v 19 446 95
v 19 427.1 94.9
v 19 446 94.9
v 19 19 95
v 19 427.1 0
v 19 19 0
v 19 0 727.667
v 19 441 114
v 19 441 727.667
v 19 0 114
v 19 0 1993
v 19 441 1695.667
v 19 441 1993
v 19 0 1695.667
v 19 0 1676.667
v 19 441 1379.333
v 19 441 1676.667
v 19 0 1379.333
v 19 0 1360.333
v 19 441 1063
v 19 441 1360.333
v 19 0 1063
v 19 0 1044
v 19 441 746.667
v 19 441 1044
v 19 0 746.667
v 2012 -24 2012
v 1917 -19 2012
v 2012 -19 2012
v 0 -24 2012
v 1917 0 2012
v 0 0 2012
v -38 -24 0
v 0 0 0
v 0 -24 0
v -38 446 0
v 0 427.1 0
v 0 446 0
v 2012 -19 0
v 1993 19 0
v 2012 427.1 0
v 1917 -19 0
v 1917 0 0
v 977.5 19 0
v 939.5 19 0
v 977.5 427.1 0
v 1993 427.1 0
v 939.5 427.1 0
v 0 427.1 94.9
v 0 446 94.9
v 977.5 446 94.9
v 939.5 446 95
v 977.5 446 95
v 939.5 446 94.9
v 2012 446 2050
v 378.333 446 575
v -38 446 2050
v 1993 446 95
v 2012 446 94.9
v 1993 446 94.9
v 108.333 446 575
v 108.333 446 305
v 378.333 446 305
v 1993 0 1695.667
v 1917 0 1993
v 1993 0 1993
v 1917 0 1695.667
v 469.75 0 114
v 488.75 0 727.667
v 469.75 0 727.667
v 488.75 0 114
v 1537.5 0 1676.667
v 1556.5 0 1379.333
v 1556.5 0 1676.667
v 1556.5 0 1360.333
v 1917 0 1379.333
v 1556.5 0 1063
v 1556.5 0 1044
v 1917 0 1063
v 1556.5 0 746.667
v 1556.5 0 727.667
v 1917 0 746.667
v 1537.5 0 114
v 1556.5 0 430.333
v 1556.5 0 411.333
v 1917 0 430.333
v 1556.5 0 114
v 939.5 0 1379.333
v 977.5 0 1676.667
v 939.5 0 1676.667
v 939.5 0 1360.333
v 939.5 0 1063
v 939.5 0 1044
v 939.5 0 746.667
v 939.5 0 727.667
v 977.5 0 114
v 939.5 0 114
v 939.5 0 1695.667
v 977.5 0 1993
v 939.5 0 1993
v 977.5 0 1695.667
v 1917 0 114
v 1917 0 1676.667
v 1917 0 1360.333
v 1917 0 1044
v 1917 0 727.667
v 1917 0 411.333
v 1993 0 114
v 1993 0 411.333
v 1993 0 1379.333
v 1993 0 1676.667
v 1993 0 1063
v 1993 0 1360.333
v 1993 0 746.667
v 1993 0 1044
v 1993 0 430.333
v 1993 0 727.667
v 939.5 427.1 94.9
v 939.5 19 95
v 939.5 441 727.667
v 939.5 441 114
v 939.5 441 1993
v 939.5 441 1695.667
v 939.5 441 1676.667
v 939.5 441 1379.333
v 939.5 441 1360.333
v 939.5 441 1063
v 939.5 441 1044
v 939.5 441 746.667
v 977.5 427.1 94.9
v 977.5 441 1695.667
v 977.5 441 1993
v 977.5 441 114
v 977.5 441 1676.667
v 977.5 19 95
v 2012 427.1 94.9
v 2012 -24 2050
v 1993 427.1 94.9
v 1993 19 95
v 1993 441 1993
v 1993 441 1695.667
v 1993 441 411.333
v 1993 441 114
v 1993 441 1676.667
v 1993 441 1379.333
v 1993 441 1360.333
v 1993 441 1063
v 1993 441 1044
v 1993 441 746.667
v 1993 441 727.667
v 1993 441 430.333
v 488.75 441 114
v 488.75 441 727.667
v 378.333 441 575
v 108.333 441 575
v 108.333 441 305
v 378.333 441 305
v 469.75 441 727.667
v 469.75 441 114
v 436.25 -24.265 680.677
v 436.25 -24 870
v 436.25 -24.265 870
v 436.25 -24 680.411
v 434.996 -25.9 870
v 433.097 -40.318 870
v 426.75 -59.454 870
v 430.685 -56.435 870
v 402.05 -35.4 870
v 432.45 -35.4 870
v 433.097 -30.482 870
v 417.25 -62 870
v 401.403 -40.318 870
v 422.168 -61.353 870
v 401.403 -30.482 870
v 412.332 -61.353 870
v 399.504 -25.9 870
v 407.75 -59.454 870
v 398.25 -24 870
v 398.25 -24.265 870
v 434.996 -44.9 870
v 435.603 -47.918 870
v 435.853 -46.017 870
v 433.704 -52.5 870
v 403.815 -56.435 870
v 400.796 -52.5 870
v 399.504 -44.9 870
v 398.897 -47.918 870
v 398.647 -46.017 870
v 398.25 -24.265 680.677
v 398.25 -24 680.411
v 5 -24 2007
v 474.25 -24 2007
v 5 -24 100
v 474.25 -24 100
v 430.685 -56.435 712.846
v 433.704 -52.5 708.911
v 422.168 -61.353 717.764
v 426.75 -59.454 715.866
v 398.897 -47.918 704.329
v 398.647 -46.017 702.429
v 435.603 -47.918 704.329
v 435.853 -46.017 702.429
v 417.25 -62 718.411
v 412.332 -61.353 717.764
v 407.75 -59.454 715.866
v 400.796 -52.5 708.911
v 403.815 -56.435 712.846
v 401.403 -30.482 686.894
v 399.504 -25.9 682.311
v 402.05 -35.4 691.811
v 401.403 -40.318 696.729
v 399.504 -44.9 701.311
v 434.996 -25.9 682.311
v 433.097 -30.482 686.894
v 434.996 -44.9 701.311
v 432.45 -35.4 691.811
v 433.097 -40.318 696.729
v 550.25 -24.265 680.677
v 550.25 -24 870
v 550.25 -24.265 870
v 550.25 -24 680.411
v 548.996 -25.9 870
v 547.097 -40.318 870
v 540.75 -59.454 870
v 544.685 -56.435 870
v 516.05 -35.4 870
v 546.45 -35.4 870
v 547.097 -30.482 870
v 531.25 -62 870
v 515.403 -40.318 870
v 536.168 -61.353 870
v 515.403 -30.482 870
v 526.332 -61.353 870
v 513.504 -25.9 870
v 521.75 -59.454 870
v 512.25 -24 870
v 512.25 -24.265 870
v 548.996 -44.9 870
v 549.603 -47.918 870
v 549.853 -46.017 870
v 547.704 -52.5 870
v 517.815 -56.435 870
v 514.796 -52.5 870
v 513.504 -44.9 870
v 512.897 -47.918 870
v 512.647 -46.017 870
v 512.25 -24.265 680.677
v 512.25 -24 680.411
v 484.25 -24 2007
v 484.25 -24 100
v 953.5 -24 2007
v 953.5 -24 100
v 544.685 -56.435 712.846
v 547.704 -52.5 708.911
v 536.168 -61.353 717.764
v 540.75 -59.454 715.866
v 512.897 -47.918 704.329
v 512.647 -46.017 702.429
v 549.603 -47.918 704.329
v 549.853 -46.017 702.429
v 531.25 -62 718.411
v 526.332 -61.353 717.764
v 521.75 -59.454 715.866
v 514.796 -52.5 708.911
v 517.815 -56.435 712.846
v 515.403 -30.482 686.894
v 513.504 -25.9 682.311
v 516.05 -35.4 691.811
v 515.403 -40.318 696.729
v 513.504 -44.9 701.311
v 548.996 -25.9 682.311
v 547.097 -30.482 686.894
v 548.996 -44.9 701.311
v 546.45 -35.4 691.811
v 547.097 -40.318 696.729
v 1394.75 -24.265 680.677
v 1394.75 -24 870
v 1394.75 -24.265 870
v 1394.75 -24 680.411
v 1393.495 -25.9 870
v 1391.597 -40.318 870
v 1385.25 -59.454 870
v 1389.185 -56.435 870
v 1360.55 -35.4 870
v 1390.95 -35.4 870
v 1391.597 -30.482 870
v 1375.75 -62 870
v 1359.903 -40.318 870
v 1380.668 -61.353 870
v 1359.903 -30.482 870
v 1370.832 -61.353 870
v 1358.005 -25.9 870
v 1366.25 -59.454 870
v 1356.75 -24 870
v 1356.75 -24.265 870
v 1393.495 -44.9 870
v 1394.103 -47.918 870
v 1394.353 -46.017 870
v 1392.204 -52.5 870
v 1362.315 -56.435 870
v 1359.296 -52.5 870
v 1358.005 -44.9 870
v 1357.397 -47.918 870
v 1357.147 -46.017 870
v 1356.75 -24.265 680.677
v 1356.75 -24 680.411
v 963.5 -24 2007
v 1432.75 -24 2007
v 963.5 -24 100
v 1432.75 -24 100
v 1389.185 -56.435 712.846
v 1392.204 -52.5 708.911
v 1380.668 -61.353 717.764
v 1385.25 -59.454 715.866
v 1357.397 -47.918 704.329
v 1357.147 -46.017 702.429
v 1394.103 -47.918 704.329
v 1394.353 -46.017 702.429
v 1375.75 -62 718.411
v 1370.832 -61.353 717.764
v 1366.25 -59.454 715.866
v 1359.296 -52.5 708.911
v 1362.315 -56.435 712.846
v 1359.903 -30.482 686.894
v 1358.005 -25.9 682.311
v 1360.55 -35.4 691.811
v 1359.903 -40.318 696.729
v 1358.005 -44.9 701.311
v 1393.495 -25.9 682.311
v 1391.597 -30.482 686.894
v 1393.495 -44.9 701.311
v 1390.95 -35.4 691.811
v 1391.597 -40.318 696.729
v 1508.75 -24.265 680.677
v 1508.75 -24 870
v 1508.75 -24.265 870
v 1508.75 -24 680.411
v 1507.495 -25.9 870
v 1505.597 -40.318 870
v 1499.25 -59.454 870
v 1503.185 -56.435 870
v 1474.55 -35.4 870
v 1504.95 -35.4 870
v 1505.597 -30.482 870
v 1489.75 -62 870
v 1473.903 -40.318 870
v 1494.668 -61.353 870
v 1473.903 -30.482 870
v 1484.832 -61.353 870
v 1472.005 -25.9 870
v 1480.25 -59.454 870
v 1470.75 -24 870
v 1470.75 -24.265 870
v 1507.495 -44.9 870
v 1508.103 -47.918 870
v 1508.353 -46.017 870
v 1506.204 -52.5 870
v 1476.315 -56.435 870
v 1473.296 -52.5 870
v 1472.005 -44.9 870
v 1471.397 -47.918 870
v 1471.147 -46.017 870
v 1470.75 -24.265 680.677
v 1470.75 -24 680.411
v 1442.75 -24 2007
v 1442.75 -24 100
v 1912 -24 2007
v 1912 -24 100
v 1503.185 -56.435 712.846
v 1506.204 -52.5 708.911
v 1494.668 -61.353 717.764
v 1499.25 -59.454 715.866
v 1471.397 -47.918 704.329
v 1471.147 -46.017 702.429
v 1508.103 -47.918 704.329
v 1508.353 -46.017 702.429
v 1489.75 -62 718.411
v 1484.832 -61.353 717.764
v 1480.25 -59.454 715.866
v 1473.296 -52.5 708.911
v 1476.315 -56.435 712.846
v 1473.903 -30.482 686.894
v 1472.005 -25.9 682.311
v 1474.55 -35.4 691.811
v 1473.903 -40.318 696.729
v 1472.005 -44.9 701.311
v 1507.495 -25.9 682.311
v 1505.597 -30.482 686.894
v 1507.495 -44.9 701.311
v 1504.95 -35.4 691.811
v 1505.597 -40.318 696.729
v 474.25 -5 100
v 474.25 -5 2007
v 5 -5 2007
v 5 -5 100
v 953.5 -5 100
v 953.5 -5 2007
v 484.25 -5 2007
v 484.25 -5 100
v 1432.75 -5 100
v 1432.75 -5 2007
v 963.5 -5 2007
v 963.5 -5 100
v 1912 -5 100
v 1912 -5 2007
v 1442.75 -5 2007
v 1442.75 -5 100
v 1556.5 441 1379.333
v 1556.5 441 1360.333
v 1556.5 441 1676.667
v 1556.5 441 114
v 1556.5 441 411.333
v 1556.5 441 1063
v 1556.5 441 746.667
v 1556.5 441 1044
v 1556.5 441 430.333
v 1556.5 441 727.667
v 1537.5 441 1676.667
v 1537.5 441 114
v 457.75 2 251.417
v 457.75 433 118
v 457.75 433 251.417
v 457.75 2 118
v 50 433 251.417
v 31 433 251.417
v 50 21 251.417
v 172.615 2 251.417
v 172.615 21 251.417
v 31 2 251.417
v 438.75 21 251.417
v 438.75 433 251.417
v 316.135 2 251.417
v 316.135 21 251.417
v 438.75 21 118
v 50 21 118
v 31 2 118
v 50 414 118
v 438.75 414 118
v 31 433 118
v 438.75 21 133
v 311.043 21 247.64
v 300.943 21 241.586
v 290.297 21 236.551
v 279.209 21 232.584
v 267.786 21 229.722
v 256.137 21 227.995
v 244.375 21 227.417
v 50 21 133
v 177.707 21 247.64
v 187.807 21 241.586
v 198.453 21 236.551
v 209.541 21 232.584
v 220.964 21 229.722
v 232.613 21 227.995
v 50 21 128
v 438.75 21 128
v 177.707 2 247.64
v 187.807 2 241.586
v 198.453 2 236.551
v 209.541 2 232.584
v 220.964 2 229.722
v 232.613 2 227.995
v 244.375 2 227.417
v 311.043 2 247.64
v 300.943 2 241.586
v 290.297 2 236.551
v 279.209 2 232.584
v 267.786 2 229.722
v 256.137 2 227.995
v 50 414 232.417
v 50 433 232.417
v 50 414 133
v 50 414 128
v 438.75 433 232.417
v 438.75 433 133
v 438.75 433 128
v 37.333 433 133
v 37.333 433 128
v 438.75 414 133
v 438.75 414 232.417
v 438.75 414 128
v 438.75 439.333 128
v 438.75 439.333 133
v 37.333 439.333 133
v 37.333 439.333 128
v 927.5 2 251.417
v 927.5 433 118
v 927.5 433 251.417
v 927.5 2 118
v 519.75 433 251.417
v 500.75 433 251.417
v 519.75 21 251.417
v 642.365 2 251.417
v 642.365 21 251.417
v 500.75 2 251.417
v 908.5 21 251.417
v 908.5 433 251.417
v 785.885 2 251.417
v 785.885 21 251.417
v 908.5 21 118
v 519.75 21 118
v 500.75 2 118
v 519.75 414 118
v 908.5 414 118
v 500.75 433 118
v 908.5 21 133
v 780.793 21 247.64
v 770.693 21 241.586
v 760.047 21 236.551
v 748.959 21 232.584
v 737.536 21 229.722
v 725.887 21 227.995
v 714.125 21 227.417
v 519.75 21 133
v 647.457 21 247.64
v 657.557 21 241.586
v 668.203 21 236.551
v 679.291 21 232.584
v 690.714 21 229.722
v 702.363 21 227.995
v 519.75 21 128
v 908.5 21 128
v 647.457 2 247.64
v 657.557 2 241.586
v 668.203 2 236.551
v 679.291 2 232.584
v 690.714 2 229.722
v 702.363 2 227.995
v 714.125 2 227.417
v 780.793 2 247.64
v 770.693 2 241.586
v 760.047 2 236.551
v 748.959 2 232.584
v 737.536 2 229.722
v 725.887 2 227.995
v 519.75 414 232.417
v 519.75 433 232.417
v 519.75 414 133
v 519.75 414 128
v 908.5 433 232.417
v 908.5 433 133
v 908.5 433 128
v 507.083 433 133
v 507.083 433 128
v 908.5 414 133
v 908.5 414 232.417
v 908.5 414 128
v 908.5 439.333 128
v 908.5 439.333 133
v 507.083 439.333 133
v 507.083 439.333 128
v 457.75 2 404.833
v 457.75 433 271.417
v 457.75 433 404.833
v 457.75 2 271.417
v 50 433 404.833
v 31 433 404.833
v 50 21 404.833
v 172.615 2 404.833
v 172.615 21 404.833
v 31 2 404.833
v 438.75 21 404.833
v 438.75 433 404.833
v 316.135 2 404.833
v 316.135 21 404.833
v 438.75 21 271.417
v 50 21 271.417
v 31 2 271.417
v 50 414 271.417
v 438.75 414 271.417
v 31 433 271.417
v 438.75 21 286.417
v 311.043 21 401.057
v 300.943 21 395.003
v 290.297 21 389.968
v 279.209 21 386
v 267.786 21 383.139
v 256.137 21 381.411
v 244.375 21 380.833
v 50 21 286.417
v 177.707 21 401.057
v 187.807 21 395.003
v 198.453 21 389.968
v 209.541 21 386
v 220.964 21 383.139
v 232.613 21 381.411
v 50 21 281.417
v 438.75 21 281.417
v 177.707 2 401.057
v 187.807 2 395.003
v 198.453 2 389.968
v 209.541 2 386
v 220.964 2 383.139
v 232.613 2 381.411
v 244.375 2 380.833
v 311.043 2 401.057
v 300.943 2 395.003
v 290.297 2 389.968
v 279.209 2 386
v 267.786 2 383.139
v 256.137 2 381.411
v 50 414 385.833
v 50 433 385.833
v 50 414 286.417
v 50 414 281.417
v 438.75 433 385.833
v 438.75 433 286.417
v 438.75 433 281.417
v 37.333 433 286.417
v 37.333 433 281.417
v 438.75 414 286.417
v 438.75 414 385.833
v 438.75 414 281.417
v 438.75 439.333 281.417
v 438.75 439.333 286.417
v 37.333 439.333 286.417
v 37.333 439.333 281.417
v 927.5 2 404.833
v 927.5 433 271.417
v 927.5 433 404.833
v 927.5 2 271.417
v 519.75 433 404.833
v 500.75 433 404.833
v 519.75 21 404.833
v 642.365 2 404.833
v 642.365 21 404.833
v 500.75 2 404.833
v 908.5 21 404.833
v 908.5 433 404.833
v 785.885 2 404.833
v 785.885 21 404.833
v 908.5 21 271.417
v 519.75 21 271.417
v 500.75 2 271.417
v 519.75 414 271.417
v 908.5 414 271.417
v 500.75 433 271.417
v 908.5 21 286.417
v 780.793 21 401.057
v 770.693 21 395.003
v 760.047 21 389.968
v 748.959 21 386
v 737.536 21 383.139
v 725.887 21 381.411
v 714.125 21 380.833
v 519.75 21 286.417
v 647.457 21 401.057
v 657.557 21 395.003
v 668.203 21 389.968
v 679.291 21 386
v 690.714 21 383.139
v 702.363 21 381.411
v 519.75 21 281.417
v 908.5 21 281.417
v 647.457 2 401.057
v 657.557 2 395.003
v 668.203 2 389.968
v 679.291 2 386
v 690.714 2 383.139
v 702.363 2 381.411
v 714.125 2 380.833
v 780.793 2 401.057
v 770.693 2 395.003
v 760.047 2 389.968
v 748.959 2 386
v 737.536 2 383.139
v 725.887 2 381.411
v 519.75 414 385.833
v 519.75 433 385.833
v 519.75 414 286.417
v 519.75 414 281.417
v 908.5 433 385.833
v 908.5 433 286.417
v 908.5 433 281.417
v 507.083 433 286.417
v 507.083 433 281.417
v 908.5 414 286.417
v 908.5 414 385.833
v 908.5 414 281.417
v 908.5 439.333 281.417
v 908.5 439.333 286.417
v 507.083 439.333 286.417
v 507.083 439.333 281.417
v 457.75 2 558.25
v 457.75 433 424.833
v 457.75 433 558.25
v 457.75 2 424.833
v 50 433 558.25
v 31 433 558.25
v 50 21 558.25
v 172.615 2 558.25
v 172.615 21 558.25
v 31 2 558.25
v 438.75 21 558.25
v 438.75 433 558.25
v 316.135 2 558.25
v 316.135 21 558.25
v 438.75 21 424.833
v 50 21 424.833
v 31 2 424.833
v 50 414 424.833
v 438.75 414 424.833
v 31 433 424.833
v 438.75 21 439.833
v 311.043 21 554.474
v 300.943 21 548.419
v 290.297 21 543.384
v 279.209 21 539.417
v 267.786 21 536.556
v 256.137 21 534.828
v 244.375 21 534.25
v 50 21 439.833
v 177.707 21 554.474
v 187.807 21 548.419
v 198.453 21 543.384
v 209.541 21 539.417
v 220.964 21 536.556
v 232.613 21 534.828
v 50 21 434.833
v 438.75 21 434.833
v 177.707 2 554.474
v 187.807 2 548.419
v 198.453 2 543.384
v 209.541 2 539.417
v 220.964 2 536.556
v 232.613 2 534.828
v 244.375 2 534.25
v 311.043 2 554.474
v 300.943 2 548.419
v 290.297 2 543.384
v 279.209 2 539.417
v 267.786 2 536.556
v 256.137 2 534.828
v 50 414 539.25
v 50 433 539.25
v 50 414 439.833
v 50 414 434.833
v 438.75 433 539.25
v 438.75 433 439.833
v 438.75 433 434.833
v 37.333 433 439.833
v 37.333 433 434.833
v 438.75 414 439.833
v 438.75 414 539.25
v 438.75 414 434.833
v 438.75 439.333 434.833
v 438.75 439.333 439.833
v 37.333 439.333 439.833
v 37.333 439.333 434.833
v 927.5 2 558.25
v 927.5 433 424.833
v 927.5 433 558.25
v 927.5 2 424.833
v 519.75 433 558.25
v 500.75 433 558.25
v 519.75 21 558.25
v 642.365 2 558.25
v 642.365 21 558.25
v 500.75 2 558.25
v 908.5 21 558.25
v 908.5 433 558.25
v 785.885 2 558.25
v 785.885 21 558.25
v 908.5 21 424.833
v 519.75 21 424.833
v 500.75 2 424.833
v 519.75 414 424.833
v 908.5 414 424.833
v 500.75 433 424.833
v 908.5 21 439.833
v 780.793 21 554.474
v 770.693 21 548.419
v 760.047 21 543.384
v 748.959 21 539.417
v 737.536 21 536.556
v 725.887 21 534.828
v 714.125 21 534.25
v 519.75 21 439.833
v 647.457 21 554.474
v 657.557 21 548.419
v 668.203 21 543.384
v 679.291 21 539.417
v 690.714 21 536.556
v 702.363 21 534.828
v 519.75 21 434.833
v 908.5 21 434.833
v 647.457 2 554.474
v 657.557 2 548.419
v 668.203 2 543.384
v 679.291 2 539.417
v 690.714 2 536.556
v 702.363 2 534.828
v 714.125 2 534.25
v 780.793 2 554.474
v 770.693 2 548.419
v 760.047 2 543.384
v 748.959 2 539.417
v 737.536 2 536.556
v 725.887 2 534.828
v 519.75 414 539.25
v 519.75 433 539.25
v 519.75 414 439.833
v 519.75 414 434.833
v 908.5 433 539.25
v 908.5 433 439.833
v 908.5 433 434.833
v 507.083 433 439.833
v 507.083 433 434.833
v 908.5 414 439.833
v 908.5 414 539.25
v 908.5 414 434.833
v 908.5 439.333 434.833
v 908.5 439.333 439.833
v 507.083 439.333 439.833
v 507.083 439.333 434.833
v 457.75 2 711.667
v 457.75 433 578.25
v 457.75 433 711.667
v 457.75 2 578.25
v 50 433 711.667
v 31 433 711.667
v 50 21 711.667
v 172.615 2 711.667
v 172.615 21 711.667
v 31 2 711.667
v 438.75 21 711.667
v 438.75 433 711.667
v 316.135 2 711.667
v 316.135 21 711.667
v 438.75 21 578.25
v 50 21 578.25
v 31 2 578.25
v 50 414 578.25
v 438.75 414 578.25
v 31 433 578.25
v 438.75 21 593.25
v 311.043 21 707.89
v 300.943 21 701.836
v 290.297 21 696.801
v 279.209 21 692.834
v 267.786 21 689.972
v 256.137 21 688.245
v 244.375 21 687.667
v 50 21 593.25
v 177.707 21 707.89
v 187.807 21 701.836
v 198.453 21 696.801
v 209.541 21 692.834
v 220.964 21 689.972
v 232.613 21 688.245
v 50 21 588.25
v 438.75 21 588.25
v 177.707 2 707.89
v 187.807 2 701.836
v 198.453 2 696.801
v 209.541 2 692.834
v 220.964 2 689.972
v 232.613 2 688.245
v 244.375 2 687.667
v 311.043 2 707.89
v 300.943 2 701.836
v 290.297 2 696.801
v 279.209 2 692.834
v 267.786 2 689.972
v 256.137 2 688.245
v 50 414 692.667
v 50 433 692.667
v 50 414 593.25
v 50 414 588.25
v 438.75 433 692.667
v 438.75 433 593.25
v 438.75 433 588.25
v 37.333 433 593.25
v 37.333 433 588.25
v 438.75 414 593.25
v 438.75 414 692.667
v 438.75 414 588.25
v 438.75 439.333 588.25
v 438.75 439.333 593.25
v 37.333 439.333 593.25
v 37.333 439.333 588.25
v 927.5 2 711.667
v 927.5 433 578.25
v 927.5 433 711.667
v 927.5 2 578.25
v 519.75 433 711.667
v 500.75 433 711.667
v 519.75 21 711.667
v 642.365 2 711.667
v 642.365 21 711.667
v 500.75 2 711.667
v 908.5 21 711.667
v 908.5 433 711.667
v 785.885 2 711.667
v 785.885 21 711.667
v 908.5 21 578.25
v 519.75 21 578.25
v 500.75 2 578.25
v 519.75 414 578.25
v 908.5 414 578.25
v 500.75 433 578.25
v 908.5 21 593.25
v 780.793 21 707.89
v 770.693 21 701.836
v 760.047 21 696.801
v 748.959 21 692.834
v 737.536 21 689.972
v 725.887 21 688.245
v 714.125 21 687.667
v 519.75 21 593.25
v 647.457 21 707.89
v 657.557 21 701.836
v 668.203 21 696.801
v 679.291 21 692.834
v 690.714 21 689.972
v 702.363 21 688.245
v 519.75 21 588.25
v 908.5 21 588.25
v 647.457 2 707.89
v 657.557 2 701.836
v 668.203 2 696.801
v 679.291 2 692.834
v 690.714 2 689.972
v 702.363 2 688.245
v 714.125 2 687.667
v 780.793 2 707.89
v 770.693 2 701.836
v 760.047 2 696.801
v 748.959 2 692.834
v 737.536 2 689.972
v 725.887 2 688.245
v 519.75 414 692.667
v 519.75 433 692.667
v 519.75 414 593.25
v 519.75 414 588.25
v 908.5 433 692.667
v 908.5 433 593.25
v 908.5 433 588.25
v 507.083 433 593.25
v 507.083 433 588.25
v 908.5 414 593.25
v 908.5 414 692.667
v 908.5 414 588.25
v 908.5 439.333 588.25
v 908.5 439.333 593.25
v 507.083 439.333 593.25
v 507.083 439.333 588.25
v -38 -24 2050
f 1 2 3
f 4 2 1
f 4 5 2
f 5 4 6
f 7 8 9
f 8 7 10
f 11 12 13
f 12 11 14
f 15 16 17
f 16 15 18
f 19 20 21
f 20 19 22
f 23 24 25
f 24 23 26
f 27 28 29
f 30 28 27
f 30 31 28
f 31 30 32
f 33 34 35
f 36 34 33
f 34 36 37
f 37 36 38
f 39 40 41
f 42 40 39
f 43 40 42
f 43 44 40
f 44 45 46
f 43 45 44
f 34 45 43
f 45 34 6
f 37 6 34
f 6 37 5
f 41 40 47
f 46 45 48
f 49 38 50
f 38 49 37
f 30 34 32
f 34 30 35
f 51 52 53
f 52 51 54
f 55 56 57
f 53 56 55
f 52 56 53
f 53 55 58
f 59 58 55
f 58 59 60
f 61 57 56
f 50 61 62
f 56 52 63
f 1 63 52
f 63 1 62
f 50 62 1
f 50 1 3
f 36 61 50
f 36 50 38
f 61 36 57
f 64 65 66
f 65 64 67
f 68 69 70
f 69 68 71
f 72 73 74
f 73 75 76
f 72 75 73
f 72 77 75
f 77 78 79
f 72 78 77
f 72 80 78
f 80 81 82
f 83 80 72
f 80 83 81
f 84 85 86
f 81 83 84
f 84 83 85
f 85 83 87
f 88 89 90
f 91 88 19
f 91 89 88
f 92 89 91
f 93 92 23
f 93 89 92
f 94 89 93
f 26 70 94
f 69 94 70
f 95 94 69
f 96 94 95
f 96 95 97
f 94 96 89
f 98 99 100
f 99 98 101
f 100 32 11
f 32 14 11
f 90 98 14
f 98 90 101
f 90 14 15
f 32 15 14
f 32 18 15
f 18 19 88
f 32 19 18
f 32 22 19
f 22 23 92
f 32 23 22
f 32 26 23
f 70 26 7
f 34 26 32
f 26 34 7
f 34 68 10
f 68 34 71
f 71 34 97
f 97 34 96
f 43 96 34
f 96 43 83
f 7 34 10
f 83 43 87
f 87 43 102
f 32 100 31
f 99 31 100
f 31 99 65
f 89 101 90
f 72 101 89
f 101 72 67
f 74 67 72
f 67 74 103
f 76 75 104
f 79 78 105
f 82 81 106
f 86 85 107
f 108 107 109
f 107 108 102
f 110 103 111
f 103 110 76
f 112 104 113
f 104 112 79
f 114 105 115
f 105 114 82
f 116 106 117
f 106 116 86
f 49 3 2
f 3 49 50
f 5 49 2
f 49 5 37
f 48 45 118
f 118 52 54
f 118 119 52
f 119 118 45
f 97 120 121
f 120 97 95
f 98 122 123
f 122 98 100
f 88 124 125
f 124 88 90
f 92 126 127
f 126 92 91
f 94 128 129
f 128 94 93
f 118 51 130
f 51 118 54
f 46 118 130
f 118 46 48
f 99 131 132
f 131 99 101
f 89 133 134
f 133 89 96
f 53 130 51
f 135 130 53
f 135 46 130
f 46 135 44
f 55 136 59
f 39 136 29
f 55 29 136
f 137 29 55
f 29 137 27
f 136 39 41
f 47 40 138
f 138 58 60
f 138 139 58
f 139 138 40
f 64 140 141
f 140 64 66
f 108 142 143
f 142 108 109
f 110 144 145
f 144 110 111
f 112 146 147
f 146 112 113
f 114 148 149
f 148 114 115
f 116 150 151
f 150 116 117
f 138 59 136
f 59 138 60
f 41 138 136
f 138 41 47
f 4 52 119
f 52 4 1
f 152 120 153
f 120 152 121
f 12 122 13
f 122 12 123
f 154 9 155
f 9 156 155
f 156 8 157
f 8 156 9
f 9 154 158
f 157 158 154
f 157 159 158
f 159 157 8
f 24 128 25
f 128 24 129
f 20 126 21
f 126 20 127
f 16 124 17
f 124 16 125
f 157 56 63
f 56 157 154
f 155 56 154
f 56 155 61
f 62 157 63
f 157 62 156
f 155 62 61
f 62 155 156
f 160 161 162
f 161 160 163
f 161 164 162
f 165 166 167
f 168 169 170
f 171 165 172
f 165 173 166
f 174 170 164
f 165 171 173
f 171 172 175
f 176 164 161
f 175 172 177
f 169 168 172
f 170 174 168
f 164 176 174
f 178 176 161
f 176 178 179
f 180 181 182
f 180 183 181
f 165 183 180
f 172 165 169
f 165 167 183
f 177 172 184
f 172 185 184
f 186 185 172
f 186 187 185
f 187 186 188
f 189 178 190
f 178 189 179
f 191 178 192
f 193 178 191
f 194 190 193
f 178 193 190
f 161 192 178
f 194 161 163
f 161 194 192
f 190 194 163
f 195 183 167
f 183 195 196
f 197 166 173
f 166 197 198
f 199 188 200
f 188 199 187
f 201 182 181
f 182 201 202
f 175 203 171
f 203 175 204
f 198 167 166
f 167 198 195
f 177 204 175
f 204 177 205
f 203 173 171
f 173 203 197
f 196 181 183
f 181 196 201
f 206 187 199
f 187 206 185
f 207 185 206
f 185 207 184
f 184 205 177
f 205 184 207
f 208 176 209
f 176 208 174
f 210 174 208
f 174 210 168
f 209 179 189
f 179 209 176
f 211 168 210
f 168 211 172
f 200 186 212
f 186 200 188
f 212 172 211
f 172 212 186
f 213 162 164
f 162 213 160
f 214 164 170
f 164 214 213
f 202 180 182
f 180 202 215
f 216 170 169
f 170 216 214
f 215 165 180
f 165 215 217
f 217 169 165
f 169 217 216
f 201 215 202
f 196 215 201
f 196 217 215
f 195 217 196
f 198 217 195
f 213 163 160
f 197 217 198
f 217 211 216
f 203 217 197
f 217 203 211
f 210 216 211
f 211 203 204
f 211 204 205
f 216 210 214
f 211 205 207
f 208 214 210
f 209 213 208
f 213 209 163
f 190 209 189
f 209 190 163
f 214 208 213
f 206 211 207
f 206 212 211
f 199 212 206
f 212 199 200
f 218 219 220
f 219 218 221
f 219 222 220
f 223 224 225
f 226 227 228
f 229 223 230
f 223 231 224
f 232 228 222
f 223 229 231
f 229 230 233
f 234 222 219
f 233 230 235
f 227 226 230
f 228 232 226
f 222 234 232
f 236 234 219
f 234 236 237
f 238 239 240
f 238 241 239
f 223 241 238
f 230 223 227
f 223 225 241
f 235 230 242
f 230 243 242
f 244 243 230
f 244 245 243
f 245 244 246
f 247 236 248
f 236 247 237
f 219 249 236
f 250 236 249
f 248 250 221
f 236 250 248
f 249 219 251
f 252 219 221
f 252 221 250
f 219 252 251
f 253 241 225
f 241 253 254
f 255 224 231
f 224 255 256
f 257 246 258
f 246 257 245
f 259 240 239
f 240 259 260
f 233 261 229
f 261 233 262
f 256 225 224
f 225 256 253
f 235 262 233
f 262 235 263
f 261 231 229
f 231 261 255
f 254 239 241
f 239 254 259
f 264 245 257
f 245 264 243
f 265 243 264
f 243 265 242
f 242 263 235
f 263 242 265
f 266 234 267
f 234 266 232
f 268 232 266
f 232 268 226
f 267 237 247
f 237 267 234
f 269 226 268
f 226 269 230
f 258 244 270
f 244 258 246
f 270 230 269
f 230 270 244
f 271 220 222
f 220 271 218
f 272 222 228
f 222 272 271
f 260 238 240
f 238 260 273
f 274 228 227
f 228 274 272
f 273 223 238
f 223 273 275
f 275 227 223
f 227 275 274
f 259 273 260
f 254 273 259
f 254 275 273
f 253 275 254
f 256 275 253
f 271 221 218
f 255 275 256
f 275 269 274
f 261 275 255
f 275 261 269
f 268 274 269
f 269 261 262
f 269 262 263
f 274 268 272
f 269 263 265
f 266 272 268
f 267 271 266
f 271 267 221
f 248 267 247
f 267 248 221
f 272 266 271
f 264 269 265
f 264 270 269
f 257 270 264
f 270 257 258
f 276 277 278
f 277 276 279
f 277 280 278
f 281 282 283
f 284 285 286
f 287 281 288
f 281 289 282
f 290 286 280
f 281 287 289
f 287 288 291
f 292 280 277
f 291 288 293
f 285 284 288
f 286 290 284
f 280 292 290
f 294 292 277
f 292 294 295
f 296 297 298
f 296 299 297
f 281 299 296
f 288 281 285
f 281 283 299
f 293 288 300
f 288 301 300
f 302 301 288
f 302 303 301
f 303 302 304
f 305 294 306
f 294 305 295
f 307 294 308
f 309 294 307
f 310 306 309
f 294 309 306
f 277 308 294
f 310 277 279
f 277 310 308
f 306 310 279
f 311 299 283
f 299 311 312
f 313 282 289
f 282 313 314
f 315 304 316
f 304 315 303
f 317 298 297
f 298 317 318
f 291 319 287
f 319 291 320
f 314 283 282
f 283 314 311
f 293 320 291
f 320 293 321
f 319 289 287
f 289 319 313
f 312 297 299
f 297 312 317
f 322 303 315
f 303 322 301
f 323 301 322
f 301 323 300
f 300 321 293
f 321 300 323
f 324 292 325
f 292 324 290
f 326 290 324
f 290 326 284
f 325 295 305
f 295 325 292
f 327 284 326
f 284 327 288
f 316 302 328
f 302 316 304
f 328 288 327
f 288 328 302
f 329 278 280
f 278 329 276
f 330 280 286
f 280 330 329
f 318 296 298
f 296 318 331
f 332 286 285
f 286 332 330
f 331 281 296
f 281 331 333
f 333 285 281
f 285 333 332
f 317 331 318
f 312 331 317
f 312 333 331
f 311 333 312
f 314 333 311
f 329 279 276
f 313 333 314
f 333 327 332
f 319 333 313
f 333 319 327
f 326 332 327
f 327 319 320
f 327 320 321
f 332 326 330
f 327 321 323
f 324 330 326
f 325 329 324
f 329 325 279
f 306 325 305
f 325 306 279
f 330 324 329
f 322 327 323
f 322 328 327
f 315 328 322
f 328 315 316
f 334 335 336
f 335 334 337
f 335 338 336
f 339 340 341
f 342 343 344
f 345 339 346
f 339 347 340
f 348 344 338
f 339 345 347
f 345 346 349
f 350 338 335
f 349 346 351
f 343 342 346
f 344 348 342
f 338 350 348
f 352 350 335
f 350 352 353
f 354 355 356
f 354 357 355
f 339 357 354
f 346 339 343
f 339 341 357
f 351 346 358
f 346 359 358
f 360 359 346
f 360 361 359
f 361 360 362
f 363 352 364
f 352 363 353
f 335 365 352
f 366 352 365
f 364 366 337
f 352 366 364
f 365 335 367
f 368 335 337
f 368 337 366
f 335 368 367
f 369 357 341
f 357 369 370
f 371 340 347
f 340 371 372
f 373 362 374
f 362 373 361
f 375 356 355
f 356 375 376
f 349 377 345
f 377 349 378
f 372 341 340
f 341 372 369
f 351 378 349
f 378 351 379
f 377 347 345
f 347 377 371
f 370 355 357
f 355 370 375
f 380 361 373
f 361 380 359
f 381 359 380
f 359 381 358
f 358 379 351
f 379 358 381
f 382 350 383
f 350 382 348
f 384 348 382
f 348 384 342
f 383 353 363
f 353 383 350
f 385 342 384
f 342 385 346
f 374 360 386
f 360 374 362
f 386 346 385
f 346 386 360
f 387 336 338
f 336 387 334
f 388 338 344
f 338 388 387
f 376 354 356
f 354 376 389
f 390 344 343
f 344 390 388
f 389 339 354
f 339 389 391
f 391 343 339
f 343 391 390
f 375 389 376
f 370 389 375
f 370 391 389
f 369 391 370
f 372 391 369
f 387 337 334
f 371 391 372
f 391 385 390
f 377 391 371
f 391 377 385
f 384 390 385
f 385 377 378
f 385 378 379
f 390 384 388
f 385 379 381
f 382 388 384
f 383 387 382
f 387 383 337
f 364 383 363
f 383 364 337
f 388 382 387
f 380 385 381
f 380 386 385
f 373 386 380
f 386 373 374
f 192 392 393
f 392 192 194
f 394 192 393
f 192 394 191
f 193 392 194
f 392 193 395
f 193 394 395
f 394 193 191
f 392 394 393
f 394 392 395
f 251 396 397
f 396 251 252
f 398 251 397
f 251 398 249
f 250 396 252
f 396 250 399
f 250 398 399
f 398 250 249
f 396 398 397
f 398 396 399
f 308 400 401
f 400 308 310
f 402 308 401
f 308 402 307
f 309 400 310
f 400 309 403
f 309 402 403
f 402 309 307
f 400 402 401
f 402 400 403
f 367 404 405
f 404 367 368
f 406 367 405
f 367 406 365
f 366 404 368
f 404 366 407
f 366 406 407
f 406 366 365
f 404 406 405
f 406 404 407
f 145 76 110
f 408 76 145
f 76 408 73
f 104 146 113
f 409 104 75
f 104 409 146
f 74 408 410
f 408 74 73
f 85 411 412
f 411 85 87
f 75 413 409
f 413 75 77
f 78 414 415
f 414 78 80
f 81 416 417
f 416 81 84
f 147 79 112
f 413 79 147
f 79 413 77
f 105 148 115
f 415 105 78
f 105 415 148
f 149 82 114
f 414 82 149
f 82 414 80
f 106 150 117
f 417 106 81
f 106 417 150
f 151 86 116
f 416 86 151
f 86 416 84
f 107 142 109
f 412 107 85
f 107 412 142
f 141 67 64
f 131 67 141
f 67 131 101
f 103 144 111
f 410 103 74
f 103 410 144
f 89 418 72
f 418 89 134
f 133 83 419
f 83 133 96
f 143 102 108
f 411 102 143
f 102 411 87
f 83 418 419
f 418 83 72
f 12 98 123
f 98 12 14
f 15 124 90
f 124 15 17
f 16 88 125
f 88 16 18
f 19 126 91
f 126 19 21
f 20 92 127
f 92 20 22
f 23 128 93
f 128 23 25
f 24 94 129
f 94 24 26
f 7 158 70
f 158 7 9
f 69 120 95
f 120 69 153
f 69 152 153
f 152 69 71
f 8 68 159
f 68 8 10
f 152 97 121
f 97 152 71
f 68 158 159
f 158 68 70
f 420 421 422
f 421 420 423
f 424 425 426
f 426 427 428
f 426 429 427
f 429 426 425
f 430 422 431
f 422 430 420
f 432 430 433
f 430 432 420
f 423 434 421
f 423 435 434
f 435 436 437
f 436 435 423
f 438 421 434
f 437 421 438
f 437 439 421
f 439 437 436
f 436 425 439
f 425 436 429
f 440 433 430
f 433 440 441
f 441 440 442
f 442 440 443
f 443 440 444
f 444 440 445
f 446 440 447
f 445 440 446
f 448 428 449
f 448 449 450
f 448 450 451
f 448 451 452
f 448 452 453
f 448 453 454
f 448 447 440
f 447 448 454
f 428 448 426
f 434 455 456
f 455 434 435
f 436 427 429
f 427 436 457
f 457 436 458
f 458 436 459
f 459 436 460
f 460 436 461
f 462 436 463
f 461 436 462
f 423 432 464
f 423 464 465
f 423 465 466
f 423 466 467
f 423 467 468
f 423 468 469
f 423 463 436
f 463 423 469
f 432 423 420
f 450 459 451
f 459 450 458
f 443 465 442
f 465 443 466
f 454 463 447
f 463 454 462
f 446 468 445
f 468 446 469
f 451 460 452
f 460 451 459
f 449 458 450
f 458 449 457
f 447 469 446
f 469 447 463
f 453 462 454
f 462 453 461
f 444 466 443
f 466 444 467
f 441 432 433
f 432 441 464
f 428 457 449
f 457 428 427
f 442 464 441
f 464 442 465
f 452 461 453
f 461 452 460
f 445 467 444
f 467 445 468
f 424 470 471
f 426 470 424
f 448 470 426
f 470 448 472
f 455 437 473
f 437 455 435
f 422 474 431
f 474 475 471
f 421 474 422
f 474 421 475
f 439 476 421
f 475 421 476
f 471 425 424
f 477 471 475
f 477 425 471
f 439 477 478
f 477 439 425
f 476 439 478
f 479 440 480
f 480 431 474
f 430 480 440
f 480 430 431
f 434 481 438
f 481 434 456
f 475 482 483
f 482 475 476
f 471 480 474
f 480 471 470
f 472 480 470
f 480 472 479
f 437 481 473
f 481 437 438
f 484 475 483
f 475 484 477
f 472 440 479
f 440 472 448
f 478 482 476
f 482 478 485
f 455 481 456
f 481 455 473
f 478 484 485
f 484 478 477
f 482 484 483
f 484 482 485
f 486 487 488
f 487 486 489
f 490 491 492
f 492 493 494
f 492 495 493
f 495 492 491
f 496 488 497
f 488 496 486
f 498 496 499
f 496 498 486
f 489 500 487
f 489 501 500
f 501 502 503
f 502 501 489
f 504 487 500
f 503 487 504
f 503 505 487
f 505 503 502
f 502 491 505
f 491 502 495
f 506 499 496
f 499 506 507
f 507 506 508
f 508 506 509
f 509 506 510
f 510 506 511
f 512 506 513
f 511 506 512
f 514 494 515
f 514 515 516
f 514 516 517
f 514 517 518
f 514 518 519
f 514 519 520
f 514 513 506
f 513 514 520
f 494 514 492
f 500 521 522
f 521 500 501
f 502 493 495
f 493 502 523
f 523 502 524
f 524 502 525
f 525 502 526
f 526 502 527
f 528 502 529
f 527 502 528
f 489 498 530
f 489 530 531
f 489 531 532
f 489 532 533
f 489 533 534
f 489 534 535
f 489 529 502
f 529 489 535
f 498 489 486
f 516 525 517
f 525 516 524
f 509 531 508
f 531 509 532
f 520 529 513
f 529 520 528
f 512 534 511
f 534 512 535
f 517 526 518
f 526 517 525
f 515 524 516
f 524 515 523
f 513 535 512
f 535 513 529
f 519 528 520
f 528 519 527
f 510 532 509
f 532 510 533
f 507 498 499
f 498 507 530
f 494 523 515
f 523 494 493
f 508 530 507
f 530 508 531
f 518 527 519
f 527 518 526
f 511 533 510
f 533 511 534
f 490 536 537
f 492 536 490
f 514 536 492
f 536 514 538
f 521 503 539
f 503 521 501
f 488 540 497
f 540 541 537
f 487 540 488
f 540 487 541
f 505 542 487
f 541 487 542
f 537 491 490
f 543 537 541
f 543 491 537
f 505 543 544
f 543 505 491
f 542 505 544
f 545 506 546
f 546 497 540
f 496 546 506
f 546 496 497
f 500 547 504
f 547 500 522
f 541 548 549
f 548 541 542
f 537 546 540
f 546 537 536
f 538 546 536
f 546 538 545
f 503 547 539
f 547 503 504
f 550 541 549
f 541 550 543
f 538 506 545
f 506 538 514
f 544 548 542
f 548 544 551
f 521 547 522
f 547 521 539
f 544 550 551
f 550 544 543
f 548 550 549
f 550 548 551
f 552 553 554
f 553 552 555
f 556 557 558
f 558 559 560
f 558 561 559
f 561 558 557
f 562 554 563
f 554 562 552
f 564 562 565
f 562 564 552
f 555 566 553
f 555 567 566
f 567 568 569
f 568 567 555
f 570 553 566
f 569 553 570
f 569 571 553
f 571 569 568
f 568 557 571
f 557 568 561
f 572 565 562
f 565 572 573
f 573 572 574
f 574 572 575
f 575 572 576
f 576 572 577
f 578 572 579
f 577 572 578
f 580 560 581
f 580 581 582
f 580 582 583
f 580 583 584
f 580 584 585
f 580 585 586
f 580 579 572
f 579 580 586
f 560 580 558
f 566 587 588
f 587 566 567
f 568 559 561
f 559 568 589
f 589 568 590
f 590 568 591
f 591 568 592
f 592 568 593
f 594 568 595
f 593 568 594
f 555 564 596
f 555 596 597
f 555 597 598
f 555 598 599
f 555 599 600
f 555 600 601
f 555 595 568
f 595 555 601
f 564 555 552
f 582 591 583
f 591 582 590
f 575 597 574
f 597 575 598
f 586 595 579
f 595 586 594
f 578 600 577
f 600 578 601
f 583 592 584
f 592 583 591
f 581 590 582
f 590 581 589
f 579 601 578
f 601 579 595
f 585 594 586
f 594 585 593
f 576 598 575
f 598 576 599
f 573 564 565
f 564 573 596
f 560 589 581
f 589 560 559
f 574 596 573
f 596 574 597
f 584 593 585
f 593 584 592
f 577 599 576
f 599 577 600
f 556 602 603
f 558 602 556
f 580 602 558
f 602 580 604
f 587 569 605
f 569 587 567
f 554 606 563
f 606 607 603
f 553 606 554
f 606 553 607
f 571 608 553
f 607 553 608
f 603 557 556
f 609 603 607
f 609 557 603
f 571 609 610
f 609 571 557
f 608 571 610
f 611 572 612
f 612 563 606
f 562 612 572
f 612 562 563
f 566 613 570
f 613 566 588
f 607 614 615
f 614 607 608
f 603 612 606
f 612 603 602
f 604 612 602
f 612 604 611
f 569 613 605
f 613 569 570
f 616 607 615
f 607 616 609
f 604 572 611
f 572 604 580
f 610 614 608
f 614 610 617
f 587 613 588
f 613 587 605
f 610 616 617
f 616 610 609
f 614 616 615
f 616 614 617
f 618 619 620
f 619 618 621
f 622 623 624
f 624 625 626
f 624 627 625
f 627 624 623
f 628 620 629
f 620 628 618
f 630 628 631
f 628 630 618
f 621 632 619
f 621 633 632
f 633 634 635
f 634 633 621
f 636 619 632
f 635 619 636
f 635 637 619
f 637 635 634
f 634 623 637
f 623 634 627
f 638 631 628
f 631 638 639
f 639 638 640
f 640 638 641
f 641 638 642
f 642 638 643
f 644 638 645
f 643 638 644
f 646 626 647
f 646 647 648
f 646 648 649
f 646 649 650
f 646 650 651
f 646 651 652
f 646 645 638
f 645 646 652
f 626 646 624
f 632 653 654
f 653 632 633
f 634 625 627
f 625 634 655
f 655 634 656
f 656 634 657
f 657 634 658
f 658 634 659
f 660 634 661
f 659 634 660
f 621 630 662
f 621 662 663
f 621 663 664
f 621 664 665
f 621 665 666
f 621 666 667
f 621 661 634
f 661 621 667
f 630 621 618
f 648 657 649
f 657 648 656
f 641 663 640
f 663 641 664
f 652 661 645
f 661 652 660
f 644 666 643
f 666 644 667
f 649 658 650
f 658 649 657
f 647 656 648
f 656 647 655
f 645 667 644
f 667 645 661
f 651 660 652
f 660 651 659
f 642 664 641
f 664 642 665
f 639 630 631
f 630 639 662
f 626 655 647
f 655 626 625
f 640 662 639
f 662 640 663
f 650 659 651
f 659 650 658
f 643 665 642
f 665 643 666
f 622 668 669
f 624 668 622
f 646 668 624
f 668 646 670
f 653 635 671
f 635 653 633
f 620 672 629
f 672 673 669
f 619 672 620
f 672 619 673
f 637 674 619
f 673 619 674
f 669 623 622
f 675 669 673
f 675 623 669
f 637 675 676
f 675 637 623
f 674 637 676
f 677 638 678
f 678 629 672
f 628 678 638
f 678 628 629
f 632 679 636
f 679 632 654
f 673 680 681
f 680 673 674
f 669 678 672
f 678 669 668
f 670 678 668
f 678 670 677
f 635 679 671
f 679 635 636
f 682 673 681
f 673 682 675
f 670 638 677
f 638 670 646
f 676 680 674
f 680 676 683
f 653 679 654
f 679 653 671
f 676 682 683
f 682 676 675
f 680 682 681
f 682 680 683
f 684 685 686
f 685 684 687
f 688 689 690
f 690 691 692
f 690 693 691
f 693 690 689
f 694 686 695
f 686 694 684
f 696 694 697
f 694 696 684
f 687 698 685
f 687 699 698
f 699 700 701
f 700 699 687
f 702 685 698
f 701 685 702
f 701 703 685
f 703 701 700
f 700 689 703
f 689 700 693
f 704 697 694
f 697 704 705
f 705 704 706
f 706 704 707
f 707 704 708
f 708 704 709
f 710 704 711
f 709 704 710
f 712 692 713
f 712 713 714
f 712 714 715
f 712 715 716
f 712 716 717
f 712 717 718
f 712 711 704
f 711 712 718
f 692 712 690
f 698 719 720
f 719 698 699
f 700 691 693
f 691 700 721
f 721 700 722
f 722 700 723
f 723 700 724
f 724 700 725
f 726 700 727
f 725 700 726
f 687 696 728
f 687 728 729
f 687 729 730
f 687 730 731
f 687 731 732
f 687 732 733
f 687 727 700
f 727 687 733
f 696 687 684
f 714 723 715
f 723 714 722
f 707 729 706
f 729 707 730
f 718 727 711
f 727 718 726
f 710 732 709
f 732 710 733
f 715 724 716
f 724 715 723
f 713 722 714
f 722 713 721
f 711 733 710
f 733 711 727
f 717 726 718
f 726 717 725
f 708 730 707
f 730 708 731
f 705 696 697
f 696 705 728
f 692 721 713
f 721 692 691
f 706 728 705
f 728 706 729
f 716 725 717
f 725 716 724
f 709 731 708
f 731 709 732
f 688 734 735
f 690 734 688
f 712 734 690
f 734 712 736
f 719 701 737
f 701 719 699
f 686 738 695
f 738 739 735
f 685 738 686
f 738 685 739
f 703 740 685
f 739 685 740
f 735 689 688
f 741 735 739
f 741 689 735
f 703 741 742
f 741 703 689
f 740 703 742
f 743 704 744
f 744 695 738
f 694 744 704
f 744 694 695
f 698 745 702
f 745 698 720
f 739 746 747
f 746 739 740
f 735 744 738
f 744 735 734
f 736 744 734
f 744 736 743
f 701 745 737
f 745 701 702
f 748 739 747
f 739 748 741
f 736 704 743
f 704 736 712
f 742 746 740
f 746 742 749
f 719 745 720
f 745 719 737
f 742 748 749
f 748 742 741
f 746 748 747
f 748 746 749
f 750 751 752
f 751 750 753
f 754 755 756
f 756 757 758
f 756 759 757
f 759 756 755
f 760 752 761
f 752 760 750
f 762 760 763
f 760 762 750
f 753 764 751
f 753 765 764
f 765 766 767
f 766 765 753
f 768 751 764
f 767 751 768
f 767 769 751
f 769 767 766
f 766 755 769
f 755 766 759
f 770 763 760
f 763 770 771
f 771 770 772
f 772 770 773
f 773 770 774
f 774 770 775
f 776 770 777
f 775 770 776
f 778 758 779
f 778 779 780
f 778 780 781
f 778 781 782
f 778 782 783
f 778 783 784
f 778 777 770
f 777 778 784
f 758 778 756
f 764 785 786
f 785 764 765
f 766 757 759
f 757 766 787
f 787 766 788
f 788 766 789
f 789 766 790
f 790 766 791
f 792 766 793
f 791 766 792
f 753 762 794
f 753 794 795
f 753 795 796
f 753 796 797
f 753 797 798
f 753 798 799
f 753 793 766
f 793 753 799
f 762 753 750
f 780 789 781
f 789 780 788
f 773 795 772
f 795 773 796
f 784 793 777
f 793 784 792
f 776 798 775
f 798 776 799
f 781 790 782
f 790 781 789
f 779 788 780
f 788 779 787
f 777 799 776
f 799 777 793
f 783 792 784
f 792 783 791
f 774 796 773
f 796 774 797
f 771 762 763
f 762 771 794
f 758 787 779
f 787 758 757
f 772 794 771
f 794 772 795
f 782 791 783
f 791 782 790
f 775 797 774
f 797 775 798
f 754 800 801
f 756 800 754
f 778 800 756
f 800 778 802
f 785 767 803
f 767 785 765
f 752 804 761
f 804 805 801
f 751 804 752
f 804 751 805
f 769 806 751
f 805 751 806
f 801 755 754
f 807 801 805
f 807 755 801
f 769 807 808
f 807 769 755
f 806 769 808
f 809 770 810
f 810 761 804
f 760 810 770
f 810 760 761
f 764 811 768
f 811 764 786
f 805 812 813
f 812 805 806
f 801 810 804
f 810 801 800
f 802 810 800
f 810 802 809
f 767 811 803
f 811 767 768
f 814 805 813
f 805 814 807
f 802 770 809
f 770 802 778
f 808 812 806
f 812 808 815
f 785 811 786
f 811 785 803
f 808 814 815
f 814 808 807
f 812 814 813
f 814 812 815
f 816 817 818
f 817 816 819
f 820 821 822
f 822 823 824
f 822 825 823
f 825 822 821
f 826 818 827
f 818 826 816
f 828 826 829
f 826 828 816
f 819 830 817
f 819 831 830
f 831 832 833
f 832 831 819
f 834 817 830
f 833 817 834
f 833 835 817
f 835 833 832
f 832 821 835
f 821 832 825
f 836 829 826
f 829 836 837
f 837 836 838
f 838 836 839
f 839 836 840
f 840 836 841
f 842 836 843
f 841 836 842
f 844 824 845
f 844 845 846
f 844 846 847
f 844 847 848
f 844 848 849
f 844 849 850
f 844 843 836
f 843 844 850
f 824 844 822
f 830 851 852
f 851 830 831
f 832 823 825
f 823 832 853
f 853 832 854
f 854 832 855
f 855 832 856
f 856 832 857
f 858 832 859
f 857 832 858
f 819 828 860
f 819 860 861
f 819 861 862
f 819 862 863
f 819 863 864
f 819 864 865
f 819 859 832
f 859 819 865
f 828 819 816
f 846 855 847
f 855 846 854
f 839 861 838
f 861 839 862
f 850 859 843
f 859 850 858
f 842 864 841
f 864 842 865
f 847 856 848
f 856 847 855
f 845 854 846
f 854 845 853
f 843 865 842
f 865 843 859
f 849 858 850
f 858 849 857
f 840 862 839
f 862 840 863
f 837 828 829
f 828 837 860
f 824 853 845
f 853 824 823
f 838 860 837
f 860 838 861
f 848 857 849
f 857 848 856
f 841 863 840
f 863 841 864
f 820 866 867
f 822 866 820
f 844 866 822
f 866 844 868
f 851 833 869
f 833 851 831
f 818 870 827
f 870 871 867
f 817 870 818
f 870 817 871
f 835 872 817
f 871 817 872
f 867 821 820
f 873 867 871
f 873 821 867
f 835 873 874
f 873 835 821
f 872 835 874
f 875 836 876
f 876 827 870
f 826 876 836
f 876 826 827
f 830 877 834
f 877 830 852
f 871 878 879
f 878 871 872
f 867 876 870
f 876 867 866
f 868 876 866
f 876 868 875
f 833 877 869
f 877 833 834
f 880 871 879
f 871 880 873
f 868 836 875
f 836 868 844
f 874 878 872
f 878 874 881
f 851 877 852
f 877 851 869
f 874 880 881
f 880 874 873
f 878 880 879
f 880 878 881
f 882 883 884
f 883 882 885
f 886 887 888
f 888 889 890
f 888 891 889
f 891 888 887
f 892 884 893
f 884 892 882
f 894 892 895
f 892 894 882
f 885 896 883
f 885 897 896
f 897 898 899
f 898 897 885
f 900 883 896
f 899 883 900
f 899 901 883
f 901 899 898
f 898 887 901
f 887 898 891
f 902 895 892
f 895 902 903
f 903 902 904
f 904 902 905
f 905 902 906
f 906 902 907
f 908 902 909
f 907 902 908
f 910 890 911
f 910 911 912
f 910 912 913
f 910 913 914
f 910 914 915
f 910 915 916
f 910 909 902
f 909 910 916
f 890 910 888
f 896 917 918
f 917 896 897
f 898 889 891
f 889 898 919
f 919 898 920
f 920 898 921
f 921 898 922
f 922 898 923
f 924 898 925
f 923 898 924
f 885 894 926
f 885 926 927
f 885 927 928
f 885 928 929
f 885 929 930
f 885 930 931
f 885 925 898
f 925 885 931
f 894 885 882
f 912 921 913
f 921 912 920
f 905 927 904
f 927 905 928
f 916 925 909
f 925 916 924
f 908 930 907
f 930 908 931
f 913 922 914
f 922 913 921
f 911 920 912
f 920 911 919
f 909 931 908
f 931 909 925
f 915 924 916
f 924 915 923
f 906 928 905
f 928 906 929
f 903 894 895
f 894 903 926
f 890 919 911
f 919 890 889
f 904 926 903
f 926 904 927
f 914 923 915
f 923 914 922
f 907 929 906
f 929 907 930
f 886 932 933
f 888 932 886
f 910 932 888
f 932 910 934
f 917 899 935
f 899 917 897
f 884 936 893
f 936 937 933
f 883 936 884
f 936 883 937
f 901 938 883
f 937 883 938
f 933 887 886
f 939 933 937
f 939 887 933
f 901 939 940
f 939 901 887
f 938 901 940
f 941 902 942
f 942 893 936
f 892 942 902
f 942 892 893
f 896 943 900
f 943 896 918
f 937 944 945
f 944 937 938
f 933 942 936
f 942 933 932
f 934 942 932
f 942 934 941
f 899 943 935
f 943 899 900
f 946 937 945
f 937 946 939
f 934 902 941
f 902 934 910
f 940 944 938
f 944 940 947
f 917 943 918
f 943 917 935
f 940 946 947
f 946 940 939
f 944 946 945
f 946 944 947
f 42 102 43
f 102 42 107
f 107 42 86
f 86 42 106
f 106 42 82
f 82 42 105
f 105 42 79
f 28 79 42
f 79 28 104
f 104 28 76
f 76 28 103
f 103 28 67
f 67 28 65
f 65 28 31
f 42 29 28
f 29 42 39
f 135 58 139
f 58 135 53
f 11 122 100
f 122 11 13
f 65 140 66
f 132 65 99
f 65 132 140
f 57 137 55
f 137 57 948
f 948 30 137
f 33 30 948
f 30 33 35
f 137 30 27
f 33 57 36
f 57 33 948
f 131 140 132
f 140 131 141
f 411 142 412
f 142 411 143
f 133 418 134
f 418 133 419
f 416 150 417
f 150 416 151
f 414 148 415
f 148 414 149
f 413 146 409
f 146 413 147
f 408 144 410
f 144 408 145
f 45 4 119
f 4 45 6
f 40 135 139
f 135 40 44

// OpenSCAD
// file: drawer.scad
//drawer

//drawer(450,200,460,19,120);

module drawer(i_depth,i_height,i_width,thickness,r){
      depth_dilat = 10;
      height_dilat = 20;
      width_dilat = 2*12;
      depth = i_depth-depth_dilat;
      height = i_height-height_dilat;
      width = i_width-width_dilat;
      loft_diff = 10;
    //loft
      loft_thickness = 5;  
    translate([width_dilat/2,depth_dilat/5,height_dilat/5]){
      difference(){
        cube([width,thickness,height]);
        translate([width/2,0,height+4/5*r]){
          rotate([90,0,0]){  
            cylinder(h=3*thickness,r=r,center=true,$fn=64);
          }
        }  
      }
      translate([0,thickness,0]){
        cube([thickness,depth-thickness,height]);  
      }  
      translate([width-thickness,thickness,0]){
        cube([thickness,depth-thickness,height]);  
      } 
      translate([thickness,depth-thickness,0]){
        cube([width-2*thickness,thickness,height-thickness]);
      }
      translate([1/3*thickness,1/3*thickness,loft_diff]){
        cube([width-4/3*thickness,depth,loft_thickness]);
      }
    }
}
// file: handrail.scad
//handrail

//thickness = 38;
//lenght = 190;
//width = 38;
//handrail(38,190,38);

module handrail(thickness,lenght,width){
diff = 0.2;
difference(){
difference(){
difference(){
union(){
cube([thickness,width*1/2,lenght]);
translate([thickness/2,0,0]){
cylinder(d=thickness,h=lenght, $fn=24);
}    
}
translate([-2/5*thickness,thickness/5,-diff]){
    cylinder(d=thickness,h=lenght+2*diff, $fn=24);
}
}
translate([+7/5*thickness,thickness/5,-diff]){
    cylinder(d=thickness,h=lenght+2*diff, $fn=24);
}
}

translate([0,-thickness/5,-pow(pow(thickness+diff,2)+pow(thickness+diff,2),1/2)/2]){
    rotate([45,0,0]){
cube([thickness+diff,thickness+diff,lenght]);
    }
}

}

}
// main file
/* [cabinet] parameters */

oheight = 2050;

owidth = 2050;

odept = 470;

plate_thickness = 19;

fitting_door = 5;

operation_door = 10;

back_thickness = 5;

show_doors = true;

coat_difference = 560;

right_shelf_count = 6;

left_shelf_count = 6;

plinth_height = 5 * plate_thickness;

saddle_plint_height =  5 * plate_thickness;

handrail_height = 870;

handrail_offset = 2*plate_thickness;

drawer_height_count = 2;
drawer_rows = 4;
drawer_handrail_r = 120;

hole_x=270;
hole_y=270;


upper_part_thickness = 2*plate_thickness;
left_site_thickness = 2*plate_thickness;

cabinet_dept=odept-plate_thickness-fitting_door;

cabinet_height=oheight-upper_part_thickness;

cabinet_width=owidth-left_site_thickness;

hole_dz=210;
hole_dx=140-left_site_thickness;

liner = 5*plate_thickness;

use <handrail.scad>;
use <drawer.scad>;

//stalls
difference(){
cube([plate_thickness,cabinet_dept,cabinet_height]);
saddlePlinth();
}
translate([(cabinet_width/2)-plate_thickness-liner/2,0,0]){
    difference(){
    cube([plate_thickness,cabinet_dept,cabinet_height]);
        saddlePlinth();
    }
}

translate([(cabinet_width/2)-liner/2,0,0]){
    difference(){
    cube([plate_thickness,cabinet_dept,cabinet_height]);
        saddlePlinth();
    }
}
translate([cabinet_width-plate_thickness,0,0]){
    difference(){
    cube([plate_thickness,cabinet_dept,cabinet_height]);
        saddlePlinth();
    }
}
//right liner
translate([cabinet_width-liner,-plate_thickness,0]){
cube([liner,plate_thickness,cabinet_height]);
}

module saddlePlinth(){
    translate([-0.1,cabinet_dept-plate_thickness+0.1,-0.1]){
    cube([2*plate_thickness,plate_thickness,    saddle_plint_height]);
    }
}

//lofts
translate([plate_thickness,0,plinth_height]){
    cube([(cabinet_width-4*plate_thickness)/2-liner/2,cabinet_dept,plate_thickness]);
}

translate([3*plate_thickness+(cabinet_width-4*plate_thickness)/2-liner/2,0,plinth_height]){
    cube([(cabinet_width-4*plate_thickness)/2+liner/2,cabinet_dept,plate_thickness]);
}



translate([plate_thickness,0,cabinet_height-plate_thickness]){
    cube([(cabinet_width-4*plate_thickness)/2-liner/2,cabinet_dept,plate_thickness]);
}


translate([3*plate_thickness+(cabinet_width-4*plate_thickness)/2-liner/2,0,cabinet_height-plate_thickness]){
    cube([(cabinet_width-4*plate_thickness)/2+liner/2,cabinet_dept,plate_thickness]);
}





//top
translate([0,cabinet_dept-odept,cabinet_height]){
    cube([cabinet_width,odept,upper_part_thickness]);
}

//left side 
translate([-left_site_thickness,cabinet_dept-odept,0]){
    cube([left_site_thickness,odept,oheight]);
}


//back
module back(delta){

   
   cube([(cabinet_width/2)-2/3*plate_thickness+delta,back_thickness,cabinet_height-plinth_height-1/3*plate_thickness]);
    
}


translate([1/3*plate_thickness,cabinet_dept-back_thickness,plinth_height]){
    difference(){
    back(-liner/2);
    translate([hole_dx,-plate_thickness,hole_dz]){
        cube([hole_x,2*plate_thickness,hole_y]);
    }
    }
}
translate([1/3*plate_thickness+(cabinet_width/2)-liner/2,cabinet_dept-back_thickness,plinth_height]){
    back(liner/2);
}

//plinth
module plinth(delta){
cube([(cabinet_width/2)-2*plate_thickness+delta,plate_thickness,plinth_height]);
}

translate([plate_thickness,0,0]){
    plinth(-liner/2);
}

translate([(cabinet_width/2)+plate_thickness-liner/2,0,0]){
    plinth(liner/2);
}

//doors
module door(){
   cube([((cabinet_width-liner)/4)-operation_door,plate_thickness,cabinet_height-plinth_height-operation_door]); 
}
module doors(){
translate([operation_door/2,-plate_thickness-fitting_door,plinth_height+operation_door/2]){
    door();
}

translate([((cabinet_width-liner)/4)+operation_door/2,-plate_thickness-fitting_door,plinth_height+operation_door/2]){
    door();
}

translate([((cabinet_width-liner)/2)+operation_door/2,-plate_thickness-fitting_door,plinth_height+operation_door/2]){
    door();
}

translate([(3*(cabinet_width-liner)/4)+operation_door/2,-plate_thickness-fitting_door,plinth_height+operation_door/2]){
    door();
}

//handrails
translate([((cabinet_width-liner)/4)-operation_door/2-handrail_offset-2*plate_thickness,-2*plate_thickness-fitting_door,handrail_height-10*plate_thickness]){
handrail(2*plate_thickness,10*plate_thickness,2*plate_thickness);
}

translate([((cabinet_width-liner)/4)-operation_door/2+handrail_offset,-2*plate_thickness-fitting_door,handrail_height-10*plate_thickness]){
handrail(2*plate_thickness,10*plate_thickness,2*plate_thickness);
}



translate([((cabinet_width-liner)*3/4)-operation_door/2-handrail_offset-2*plate_thickness,-2*plate_thickness-fitting_door,handrail_height-10*plate_thickness]){
handrail(2*plate_thickness,10*plate_thickness,2*plate_thickness);
}

translate([((cabinet_width-liner)*3/4)-operation_door/2+handrail_offset,-2*plate_thickness-fitting_door,handrail_height-10*plate_thickness]){
handrail(2*plate_thickness,10*plate_thickness,2*plate_thickness);
}
}

if (show_doors) {
    doors();
}


function shelfsDiff(cabinetHeight,plateThickness,shelfCount, plinthHeight) = (cabinetHeight-plinthHeight-((shelfCount+1)*plateThickness))/shelfCount;

//right shelfs
module rightShelfs(){ 
//echo(cabinet_height,plate_thickness,right_shelf_count,plinth_height);
sdiff =  shelfsDiff(cabinet_height,plate_thickness,right_shelf_count, plinth_height);
    echo(sdiff);

translate([3*plate_thickness+(cabinet_width-4*plate_thickness)/2-liner/2,0,cabinet_height-2*plate_thickness-sdiff]){
    cube([(cabinet_width-4*plate_thickness)/2+liner/2,cabinet_dept,plate_thickness]);
}
//shelf stall
translate([3*plate_thickness+(cabinet_width-4*plate_thickness-liner)/2+coat_difference,0,plinth_height+plate_thickness]){
    cube([plate_thickness,cabinet_dept,cabinet_height-sdiff-3*plate_thickness-plinth_height]);
}
for (z =[2:right_shelf_count-1]){
    
    translate([3*plate_thickness+(cabinet_width-4*plate_thickness-liner)/2+coat_difference+plate_thickness,0,cabinet_height-(z+1)*plate_thickness-z*sdiff]){
    cube([(cabinet_width-4*plate_thickness+liner)/2-coat_difference-plate_thickness,cabinet_dept,plate_thickness]);
    }
    
}

}
rightShelfs();

function getDrawerHeight(drawer_height_count,plate_thickness,cabinet_height,left_shelf_count,plinth_height) = (drawer_height_count-1)*plate_thickness+drawer_height_count*shelfsDiff(cabinet_height,plate_thickness,left_shelf_count, plinth_height);

//left shelfs
module leftShelfs(){ 
sdiff =  shelfsDiff(cabinet_height,plate_thickness,left_shelf_count, plinth_height);

//shelf stall drawers
translate([plate_thickness+(cabinet_width-6*plate_thickness-liner)/4,0,plinth_height+plate_thickness]){
    cube([plate_thickness,cabinet_dept,(drawer_height_count-1)*plate_thickness+drawer_height_count*sdiff]);
}
for (z =[1:(left_shelf_count-drawer_height_count)]){
    
    translate([plate_thickness,0,cabinet_height-(z+1)*plate_thickness-z*sdiff]){
    cube([(cabinet_width-4*plate_thickness)/2-liner/2,cabinet_dept,plate_thickness]);
    }
    
}

}
leftShelfs();

function drawersDiff(height,drawer_rows) = height/drawer_rows;

ddiff =  drawersDiff(getDrawerHeight(drawer_height_count,plate_thickness,cabinet_height,left_shelf_count,plinth_height),drawer_rows);

for (z =[1:drawer_rows]){
translate([plate_thickness,0,plinth_height+plate_thickness+(z-1)*ddiff]){
drawer(cabinet_dept-back_thickness,ddiff,((cabinet_width-4*plate_thickness)/2-plate_thickness-liner/2)/2,plate_thickness,drawer_handrail_r);
}
translate([2*plate_thickness+((cabinet_width-4*plate_thickness)/2-plate_thickness)/2-liner/4,0,plinth_height+plate_thickness+(z-1)*ddiff]){
drawer(cabinet_dept-back_thickness,ddiff,((cabinet_width-4*plate_thickness)/2-plate_thickness-liner/2)/2,plate_thickness,drawer_handrail_r);
}

}
